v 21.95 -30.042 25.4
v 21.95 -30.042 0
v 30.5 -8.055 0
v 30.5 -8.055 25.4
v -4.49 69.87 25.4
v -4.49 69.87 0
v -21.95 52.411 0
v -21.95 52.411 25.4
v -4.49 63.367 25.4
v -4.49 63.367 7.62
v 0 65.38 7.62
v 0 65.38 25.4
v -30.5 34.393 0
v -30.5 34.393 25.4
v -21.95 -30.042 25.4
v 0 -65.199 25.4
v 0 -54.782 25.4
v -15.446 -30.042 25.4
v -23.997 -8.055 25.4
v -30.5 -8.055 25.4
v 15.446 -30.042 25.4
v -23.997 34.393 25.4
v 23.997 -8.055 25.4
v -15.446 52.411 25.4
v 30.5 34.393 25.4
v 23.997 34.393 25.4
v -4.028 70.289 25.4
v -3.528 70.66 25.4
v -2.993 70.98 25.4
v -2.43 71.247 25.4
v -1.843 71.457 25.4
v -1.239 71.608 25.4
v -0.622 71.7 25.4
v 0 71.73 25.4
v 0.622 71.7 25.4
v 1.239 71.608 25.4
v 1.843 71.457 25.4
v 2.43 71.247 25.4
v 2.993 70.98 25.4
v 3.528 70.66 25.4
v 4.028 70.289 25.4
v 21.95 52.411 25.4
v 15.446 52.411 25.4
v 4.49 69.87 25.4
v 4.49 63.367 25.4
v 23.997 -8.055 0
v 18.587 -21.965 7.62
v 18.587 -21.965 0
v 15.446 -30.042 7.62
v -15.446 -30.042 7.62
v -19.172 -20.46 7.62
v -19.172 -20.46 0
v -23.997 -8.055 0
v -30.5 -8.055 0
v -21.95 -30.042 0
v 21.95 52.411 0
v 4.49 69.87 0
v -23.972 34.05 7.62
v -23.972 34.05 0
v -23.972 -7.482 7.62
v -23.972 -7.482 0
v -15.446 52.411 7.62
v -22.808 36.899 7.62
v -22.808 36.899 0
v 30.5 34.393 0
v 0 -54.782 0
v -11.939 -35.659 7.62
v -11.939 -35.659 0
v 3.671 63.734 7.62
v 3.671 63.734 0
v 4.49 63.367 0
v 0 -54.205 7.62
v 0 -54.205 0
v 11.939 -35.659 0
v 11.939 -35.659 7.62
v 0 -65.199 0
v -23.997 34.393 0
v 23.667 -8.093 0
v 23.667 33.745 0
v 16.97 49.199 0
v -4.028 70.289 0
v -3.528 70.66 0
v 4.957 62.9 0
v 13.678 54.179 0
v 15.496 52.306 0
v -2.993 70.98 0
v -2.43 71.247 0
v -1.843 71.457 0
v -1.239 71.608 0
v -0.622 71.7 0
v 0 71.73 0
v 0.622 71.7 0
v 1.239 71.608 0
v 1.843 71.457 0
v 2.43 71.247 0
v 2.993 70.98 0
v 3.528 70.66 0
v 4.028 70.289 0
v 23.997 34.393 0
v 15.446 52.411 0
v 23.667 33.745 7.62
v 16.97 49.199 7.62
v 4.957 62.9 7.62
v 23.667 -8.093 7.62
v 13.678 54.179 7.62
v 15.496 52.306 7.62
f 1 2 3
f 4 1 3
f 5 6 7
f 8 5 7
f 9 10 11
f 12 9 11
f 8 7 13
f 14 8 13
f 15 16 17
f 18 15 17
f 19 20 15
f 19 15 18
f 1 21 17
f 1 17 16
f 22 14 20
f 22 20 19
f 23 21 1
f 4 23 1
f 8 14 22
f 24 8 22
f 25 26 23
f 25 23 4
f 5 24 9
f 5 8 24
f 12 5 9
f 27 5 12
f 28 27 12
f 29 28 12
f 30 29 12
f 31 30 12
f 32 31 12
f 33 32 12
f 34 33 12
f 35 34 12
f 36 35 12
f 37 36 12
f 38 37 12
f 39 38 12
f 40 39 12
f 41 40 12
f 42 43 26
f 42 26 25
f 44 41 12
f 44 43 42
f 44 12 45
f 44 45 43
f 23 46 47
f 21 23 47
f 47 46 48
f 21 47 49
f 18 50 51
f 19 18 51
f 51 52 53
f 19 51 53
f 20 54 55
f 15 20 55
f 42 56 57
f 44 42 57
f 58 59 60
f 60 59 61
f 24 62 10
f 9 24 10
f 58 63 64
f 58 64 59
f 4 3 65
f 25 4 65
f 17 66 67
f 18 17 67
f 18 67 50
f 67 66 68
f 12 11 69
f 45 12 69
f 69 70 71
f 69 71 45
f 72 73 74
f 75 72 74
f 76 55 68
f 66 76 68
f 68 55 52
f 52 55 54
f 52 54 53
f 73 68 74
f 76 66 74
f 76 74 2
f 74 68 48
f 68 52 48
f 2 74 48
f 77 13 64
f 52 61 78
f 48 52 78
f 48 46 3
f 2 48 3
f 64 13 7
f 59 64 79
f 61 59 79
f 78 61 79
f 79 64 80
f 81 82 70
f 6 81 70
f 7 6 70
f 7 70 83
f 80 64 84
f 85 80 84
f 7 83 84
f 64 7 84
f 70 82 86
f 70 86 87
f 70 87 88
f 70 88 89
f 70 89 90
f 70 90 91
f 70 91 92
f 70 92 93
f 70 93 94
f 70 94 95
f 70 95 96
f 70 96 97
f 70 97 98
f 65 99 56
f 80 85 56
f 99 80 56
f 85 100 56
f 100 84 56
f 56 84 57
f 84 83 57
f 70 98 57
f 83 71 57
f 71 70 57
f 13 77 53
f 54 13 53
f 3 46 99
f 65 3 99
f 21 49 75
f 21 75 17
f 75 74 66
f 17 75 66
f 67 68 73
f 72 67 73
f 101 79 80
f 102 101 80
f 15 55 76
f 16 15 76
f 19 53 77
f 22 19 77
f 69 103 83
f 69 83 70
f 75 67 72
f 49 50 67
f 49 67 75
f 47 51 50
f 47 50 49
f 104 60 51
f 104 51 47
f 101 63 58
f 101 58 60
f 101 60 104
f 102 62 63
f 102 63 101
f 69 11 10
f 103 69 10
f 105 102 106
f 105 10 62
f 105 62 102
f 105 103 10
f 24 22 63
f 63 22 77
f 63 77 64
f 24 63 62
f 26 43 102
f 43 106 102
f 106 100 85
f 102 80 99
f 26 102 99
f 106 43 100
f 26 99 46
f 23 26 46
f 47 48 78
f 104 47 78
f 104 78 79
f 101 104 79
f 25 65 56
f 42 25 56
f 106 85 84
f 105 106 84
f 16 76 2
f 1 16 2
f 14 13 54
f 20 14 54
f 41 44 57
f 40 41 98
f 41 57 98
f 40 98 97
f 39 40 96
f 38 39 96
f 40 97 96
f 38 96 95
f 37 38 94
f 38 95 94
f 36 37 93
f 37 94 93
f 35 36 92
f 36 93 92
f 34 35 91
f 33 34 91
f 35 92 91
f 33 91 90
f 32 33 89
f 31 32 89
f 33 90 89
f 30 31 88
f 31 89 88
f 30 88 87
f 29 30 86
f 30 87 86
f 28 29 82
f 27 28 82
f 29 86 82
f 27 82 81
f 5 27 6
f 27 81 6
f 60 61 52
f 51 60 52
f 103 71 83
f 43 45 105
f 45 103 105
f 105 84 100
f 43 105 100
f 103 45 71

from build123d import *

# Parameters (mm, degrees)
F1_DEPTH = 25.4
F3_DEPTH = 7.62


with BuildPart() as f1:
    # F0 (on Top) → F1 (new body)
    with BuildSketch(Plane.XY):
        with BuildLine():
            Line((-21.94954, -30.042156), (0, -65.198988))
            Line((0, -65.198988), (21.94954, -30.042156))
            Line((21.94954, -30.042156), (30.500225, -8.054676))
            Line((30.500225, -8.054676), (30.500225, 34.393379))
            Line((30.500225, 34.393379), (21.94954, 52.410898))
            Line((21.94954, 52.410898), (4.490128, 69.87031))
            ThreePointArc((4.490128, 69.87031), (0, 71.730182), (-4.490128, 69.87031))
            Line((-4.490128, 69.87031), (-21.94954, 52.410898))
            Line((-21.94954, 52.410898), (-30.500225, 34.393379))
            Line((-30.500225, 34.393379), (-30.500225, -8.054676))
            Line((-30.500225, -8.054676), (-21.94954, -30.042156))
        make_face()
        Polygon((-15.445927, 52.410898), (-4.490128, 63.366696), (0, 65.380182), (4.490128, 63.366696), (15.445927, 52.410898), (23.996611, 34.393379), (23.996611, -8.054676), (15.445927, -30.042156), (0, -54.782075), (-15.445927, -30.042156), (-23.996611, -8.054676), (-23.996611, 34.393379), align=None, mode=Mode.SUBTRACT)
    extrude(amount=F1_DEPTH)

    # F2 (on Top) → F3 (join)
    with BuildSketch(Plane.XY):
        Polygon((-16.171693, 53.127095), (-23.972463, 34.050059), (-23.972463, -7.481851), (-15.727157, -29.774714), (0, -54.20525), (15.727157, -29.774714), (23.667078, -8.092615), (23.667078, 33.744678), (15.727157, 52.067574), (5.649563, 62.45055), (0, 66.115133), (-6.565708, 62.45055), align=None)
    extrude(amount=F3_DEPTH)


solid = f1.part
